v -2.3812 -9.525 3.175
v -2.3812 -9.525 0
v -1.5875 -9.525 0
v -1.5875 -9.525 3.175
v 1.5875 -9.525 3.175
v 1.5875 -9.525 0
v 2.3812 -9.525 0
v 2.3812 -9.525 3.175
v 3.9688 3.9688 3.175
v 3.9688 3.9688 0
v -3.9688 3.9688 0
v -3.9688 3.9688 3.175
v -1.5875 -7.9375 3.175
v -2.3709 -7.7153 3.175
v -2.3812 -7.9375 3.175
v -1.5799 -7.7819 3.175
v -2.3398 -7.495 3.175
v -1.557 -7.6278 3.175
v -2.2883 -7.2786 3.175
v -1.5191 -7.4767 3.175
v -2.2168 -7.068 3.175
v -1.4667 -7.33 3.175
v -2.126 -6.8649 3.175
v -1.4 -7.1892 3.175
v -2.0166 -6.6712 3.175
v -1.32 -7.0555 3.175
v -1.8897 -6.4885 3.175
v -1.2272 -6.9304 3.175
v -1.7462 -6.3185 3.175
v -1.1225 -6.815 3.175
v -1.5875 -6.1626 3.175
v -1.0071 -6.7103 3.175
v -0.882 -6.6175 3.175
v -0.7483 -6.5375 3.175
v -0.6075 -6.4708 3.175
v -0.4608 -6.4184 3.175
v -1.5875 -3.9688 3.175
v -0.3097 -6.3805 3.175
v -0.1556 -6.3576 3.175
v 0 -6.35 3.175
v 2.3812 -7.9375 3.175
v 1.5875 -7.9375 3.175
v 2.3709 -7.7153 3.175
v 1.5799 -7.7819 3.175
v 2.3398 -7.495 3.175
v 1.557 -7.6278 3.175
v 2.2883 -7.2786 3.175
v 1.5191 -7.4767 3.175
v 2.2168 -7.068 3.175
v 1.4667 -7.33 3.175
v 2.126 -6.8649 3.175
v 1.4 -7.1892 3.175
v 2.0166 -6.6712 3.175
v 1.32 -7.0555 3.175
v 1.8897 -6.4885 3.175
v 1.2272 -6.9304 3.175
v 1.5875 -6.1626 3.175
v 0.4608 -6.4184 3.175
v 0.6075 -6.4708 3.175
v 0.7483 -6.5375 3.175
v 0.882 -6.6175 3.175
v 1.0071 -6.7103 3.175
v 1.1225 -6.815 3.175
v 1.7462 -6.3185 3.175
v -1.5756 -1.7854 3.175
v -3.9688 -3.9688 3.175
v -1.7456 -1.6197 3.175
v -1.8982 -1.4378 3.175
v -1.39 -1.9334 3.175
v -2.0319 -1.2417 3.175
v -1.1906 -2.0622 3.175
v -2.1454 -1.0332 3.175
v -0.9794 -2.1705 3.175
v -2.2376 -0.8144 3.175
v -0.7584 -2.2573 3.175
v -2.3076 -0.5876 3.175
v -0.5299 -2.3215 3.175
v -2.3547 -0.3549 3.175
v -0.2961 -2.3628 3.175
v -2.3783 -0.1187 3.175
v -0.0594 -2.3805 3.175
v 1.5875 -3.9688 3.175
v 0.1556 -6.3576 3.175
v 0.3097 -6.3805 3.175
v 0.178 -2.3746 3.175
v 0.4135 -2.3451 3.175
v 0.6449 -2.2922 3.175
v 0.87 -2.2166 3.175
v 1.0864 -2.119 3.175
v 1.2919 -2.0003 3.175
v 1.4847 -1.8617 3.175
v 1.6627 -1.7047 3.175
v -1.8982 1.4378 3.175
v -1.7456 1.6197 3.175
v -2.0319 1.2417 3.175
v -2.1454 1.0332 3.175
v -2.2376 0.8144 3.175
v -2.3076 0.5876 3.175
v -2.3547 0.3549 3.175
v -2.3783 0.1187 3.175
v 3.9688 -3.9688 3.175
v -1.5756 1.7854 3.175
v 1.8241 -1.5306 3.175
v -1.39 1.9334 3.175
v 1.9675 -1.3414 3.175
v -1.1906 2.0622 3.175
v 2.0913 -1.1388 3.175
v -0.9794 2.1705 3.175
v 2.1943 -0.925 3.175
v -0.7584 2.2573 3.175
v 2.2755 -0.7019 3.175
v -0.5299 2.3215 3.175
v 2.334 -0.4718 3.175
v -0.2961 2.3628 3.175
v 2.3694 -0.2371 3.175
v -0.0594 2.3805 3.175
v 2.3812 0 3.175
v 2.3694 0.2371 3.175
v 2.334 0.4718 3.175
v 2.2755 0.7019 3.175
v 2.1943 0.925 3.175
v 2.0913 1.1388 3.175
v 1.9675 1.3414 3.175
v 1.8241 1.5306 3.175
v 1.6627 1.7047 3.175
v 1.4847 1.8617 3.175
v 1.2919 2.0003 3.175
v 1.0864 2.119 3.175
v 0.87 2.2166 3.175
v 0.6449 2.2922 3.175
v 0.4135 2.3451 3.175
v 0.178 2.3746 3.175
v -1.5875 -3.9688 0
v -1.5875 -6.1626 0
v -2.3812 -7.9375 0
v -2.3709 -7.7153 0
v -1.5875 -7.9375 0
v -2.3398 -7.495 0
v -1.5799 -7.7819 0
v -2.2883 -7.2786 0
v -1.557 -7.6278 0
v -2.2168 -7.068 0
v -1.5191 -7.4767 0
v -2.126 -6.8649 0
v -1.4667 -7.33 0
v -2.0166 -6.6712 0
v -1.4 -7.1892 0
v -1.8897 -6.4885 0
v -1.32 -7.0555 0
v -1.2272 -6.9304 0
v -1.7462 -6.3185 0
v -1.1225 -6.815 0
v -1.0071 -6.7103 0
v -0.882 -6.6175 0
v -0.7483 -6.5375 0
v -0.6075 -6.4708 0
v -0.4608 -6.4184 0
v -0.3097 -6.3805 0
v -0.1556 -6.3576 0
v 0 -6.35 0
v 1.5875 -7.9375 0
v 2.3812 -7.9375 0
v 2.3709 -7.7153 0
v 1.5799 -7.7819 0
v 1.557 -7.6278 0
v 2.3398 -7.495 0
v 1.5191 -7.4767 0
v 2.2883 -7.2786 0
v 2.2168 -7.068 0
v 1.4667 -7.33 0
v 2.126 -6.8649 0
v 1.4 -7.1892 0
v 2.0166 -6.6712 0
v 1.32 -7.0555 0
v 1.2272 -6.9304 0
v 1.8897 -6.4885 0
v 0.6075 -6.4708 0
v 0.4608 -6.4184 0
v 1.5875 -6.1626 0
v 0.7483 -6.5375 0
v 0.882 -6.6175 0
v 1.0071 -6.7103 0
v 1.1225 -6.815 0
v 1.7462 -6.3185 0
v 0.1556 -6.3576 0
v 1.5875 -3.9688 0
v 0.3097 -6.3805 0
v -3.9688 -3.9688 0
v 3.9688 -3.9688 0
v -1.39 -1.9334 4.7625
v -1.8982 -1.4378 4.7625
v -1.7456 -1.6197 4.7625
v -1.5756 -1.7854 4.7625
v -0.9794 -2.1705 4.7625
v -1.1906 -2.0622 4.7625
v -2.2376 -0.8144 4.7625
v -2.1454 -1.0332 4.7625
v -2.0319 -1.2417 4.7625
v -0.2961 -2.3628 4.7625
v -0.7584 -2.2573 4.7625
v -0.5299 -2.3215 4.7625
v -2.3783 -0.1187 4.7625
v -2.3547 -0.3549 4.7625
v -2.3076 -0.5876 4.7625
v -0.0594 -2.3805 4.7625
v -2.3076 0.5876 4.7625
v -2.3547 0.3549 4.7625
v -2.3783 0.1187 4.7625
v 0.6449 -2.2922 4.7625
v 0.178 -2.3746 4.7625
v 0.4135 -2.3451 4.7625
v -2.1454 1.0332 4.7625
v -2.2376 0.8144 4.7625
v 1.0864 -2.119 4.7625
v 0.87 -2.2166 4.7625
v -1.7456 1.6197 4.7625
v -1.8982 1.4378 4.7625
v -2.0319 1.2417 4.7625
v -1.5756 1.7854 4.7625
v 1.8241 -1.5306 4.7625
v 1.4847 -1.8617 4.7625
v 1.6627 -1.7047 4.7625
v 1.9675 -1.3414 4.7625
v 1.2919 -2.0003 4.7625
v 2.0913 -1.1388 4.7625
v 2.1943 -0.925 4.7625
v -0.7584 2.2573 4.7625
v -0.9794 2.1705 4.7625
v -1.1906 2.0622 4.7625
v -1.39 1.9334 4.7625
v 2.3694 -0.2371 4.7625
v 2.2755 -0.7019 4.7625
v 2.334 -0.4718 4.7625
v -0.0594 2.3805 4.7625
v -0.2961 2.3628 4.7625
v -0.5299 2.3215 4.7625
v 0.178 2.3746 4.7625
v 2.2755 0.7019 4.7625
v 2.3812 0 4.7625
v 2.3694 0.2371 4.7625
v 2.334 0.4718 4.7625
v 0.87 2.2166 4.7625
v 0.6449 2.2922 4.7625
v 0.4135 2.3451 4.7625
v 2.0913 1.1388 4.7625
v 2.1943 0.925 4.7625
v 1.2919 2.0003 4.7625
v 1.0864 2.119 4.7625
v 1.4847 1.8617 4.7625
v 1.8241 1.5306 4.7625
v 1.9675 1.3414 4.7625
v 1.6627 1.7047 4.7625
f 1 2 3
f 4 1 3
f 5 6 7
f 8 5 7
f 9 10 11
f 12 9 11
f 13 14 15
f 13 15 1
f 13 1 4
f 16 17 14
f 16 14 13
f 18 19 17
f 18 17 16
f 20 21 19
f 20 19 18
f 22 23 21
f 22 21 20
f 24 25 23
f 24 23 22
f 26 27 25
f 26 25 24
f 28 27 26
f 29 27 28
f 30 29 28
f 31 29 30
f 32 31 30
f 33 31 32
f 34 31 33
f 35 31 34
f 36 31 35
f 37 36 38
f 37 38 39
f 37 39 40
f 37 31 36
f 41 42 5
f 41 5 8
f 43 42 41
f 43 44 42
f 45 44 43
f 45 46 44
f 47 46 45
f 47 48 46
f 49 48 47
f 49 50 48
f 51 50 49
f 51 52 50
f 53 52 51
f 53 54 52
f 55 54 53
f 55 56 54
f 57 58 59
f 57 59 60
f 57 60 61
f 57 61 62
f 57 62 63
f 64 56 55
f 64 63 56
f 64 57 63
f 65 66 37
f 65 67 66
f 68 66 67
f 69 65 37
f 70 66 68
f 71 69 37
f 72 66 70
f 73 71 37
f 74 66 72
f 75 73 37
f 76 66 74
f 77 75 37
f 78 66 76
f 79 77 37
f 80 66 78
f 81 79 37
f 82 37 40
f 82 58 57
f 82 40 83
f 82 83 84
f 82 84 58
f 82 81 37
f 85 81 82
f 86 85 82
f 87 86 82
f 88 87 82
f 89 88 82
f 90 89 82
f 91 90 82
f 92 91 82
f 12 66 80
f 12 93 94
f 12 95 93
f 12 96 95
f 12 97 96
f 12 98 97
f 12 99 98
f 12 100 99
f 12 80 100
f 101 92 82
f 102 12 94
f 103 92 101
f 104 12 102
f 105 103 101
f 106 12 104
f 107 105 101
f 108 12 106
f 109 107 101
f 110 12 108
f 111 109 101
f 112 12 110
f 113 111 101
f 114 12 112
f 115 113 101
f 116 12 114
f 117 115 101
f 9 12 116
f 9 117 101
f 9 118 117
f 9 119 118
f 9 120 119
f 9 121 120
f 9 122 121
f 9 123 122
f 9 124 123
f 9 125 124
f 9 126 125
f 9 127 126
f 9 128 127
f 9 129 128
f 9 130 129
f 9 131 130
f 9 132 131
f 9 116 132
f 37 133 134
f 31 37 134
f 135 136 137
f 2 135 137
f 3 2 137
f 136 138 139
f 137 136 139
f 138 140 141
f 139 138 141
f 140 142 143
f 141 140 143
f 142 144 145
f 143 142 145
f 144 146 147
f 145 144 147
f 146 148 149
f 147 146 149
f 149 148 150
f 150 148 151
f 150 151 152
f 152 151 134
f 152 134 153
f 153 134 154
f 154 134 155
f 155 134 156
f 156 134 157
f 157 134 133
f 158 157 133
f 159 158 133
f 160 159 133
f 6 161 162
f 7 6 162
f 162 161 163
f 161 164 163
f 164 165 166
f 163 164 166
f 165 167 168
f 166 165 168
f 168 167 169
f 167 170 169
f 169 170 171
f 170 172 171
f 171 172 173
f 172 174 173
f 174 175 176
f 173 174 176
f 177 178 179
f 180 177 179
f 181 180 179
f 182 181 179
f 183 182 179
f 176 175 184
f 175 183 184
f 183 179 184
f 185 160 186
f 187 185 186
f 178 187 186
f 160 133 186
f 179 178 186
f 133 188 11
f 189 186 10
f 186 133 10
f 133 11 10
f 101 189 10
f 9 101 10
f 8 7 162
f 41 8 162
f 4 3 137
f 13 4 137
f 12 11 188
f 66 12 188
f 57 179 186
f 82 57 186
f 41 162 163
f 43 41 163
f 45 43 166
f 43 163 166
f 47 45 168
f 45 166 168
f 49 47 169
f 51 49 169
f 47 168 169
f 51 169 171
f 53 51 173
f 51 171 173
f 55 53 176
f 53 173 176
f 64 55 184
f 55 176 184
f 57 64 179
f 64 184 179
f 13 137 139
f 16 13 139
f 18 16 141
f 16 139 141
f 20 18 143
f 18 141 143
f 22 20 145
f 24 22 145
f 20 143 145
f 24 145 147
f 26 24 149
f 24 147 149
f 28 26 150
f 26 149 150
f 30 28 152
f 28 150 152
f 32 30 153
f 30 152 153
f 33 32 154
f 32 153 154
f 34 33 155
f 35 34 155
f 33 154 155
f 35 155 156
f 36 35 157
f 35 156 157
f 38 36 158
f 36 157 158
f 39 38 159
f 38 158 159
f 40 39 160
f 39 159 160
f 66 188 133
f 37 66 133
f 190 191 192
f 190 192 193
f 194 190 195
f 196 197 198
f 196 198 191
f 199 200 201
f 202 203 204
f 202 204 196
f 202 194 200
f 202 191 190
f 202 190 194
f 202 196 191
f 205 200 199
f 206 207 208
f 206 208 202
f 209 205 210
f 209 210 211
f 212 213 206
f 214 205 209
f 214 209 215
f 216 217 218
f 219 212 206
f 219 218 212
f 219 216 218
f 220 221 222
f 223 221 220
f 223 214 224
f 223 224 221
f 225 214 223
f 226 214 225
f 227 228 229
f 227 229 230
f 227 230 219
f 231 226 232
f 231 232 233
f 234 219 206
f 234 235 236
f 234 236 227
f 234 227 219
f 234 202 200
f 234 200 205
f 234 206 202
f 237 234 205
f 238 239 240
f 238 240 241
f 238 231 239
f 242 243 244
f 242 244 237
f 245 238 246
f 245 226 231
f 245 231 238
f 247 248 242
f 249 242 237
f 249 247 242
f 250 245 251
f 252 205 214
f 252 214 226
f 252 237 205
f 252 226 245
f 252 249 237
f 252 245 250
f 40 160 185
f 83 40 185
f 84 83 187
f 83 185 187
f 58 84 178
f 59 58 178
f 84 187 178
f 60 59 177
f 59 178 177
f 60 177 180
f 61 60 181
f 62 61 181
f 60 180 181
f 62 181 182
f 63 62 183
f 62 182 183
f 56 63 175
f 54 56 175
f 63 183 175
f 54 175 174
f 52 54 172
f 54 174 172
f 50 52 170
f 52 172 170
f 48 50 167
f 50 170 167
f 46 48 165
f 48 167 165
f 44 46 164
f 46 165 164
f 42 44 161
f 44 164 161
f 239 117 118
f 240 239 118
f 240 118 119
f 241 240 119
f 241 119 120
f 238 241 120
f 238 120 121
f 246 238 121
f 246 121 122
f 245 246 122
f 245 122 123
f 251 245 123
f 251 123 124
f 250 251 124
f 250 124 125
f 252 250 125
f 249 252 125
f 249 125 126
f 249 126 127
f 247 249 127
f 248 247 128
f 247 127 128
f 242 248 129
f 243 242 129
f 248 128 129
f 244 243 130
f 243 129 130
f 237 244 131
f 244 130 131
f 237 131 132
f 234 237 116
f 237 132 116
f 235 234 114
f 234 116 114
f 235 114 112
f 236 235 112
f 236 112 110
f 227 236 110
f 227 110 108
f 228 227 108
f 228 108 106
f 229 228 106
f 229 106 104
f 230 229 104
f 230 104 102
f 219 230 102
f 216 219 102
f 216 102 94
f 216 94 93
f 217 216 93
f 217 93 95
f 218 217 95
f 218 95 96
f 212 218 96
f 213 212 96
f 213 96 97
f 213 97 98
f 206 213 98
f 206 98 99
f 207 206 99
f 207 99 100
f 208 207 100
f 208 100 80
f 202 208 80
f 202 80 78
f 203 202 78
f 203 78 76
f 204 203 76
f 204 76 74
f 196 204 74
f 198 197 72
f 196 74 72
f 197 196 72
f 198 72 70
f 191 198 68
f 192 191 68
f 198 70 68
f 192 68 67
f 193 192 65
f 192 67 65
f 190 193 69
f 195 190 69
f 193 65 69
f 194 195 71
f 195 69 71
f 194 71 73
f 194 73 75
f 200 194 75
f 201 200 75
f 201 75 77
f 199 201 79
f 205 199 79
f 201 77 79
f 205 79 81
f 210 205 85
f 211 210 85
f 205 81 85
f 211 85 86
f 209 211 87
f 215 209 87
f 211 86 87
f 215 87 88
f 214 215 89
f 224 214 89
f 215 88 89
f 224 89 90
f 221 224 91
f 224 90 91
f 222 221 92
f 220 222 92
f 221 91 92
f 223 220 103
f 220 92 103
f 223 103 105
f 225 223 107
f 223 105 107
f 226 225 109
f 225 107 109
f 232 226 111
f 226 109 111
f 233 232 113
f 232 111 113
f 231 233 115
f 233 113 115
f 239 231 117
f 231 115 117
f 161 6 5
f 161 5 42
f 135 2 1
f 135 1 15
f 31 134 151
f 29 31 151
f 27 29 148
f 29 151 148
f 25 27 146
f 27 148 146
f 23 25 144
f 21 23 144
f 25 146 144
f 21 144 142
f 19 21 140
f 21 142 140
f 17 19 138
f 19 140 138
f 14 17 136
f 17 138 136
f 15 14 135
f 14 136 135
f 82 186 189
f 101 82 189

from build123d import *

# Parameters (mm, degrees)
F0_R     = 2.38125
F0_W     = 0.79375
F0_H     = 1.5875
F1_DEPTH = 3.175
F2_DEPTH = 4.7625


with BuildPart() as f1:
    # F0 (on Top) → F1 (new body)
    with BuildSketch(Plane.XY):
        Polygon((3.96875, 3.96875), (-3.96875, 3.96875), (-3.96875, -3.96875), (-1.5875, -3.96875), (-0.79375, -3.96875), (0, -3.96875), (0.79375, -3.96875), (1.5875, -3.96875), (3.96875, -3.96875), align=None)
        Circle(F0_R, mode=Mode.SUBTRACT)
        Polygon((-0.79375, -3.96875), (-1.5875, -3.96875), (-1.5875, -5.55625), (0, -5.55625), (0, -3.96875), align=None)
        Polygon((1.5875, -5.55625), (1.5875, -3.96875), (0.79375, -3.96875), (0, -3.96875), (0, -5.55625), align=None)
        with BuildLine():
            Line((1.5875, -6.162621), (1.5875, -5.55625))
            Line((1.5875, -5.55625), (0, -5.55625))
            ThreePointArc((0, -5.55625), (0.849683, -5.713002), (1.5875, -6.162621))
        make_face()
        with BuildLine():
            Line((0, -5.55625), (-1.5875, -5.55625))
            Line((-1.5875, -5.55625), (-1.5875, -6.162621))
            ThreePointArc((-1.5875, -6.162621), (-0.849683, -5.713002), (0, -5.55625))
        make_face()
        with BuildLine():
            Line((0, -6.35), (0, -5.55625))
            ThreePointArc((0, -5.55625), (-0.849683, -5.713002), (-1.5875, -6.162621))
            ThreePointArc((-1.5875, -6.162621), (-2.173774, -6.965359), (-2.38125, -7.9375))
            Line((-2.38125, -7.9375), (-1.5875, -7.9375))
            ThreePointArc((-1.5875, -7.9375), (-1.122532, -6.814968), (0, -6.35))
        make_face()
        with Locations((-1.984375, -8.73125)):
            Rectangle(F0_W, F0_H)
        with BuildLine():
            ThreePointArc((1.5875, -6.162621), (0.849683, -5.713002), (0, -5.55625))
            Line((0, -5.55625), (0, -6.35))
            ThreePointArc((0, -6.35), (1.122532, -6.814968), (1.5875, -7.9375))
            Line((1.5875, -7.9375), (2.38125, -7.9375))
            ThreePointArc((2.38125, -7.9375), (2.173774, -6.965359), (1.5875, -6.162621))
        make_face()
        with Locations((1.984375, -8.73125)):
            Rectangle(F0_W, F0_H)
    extrude(amount=F1_DEPTH)

    # F0 (on Top) → F2 (join)
    with BuildSketch(Plane.XY):
        Circle(F0_R)
    extrude(amount=F2_DEPTH)


solid = f1.part
